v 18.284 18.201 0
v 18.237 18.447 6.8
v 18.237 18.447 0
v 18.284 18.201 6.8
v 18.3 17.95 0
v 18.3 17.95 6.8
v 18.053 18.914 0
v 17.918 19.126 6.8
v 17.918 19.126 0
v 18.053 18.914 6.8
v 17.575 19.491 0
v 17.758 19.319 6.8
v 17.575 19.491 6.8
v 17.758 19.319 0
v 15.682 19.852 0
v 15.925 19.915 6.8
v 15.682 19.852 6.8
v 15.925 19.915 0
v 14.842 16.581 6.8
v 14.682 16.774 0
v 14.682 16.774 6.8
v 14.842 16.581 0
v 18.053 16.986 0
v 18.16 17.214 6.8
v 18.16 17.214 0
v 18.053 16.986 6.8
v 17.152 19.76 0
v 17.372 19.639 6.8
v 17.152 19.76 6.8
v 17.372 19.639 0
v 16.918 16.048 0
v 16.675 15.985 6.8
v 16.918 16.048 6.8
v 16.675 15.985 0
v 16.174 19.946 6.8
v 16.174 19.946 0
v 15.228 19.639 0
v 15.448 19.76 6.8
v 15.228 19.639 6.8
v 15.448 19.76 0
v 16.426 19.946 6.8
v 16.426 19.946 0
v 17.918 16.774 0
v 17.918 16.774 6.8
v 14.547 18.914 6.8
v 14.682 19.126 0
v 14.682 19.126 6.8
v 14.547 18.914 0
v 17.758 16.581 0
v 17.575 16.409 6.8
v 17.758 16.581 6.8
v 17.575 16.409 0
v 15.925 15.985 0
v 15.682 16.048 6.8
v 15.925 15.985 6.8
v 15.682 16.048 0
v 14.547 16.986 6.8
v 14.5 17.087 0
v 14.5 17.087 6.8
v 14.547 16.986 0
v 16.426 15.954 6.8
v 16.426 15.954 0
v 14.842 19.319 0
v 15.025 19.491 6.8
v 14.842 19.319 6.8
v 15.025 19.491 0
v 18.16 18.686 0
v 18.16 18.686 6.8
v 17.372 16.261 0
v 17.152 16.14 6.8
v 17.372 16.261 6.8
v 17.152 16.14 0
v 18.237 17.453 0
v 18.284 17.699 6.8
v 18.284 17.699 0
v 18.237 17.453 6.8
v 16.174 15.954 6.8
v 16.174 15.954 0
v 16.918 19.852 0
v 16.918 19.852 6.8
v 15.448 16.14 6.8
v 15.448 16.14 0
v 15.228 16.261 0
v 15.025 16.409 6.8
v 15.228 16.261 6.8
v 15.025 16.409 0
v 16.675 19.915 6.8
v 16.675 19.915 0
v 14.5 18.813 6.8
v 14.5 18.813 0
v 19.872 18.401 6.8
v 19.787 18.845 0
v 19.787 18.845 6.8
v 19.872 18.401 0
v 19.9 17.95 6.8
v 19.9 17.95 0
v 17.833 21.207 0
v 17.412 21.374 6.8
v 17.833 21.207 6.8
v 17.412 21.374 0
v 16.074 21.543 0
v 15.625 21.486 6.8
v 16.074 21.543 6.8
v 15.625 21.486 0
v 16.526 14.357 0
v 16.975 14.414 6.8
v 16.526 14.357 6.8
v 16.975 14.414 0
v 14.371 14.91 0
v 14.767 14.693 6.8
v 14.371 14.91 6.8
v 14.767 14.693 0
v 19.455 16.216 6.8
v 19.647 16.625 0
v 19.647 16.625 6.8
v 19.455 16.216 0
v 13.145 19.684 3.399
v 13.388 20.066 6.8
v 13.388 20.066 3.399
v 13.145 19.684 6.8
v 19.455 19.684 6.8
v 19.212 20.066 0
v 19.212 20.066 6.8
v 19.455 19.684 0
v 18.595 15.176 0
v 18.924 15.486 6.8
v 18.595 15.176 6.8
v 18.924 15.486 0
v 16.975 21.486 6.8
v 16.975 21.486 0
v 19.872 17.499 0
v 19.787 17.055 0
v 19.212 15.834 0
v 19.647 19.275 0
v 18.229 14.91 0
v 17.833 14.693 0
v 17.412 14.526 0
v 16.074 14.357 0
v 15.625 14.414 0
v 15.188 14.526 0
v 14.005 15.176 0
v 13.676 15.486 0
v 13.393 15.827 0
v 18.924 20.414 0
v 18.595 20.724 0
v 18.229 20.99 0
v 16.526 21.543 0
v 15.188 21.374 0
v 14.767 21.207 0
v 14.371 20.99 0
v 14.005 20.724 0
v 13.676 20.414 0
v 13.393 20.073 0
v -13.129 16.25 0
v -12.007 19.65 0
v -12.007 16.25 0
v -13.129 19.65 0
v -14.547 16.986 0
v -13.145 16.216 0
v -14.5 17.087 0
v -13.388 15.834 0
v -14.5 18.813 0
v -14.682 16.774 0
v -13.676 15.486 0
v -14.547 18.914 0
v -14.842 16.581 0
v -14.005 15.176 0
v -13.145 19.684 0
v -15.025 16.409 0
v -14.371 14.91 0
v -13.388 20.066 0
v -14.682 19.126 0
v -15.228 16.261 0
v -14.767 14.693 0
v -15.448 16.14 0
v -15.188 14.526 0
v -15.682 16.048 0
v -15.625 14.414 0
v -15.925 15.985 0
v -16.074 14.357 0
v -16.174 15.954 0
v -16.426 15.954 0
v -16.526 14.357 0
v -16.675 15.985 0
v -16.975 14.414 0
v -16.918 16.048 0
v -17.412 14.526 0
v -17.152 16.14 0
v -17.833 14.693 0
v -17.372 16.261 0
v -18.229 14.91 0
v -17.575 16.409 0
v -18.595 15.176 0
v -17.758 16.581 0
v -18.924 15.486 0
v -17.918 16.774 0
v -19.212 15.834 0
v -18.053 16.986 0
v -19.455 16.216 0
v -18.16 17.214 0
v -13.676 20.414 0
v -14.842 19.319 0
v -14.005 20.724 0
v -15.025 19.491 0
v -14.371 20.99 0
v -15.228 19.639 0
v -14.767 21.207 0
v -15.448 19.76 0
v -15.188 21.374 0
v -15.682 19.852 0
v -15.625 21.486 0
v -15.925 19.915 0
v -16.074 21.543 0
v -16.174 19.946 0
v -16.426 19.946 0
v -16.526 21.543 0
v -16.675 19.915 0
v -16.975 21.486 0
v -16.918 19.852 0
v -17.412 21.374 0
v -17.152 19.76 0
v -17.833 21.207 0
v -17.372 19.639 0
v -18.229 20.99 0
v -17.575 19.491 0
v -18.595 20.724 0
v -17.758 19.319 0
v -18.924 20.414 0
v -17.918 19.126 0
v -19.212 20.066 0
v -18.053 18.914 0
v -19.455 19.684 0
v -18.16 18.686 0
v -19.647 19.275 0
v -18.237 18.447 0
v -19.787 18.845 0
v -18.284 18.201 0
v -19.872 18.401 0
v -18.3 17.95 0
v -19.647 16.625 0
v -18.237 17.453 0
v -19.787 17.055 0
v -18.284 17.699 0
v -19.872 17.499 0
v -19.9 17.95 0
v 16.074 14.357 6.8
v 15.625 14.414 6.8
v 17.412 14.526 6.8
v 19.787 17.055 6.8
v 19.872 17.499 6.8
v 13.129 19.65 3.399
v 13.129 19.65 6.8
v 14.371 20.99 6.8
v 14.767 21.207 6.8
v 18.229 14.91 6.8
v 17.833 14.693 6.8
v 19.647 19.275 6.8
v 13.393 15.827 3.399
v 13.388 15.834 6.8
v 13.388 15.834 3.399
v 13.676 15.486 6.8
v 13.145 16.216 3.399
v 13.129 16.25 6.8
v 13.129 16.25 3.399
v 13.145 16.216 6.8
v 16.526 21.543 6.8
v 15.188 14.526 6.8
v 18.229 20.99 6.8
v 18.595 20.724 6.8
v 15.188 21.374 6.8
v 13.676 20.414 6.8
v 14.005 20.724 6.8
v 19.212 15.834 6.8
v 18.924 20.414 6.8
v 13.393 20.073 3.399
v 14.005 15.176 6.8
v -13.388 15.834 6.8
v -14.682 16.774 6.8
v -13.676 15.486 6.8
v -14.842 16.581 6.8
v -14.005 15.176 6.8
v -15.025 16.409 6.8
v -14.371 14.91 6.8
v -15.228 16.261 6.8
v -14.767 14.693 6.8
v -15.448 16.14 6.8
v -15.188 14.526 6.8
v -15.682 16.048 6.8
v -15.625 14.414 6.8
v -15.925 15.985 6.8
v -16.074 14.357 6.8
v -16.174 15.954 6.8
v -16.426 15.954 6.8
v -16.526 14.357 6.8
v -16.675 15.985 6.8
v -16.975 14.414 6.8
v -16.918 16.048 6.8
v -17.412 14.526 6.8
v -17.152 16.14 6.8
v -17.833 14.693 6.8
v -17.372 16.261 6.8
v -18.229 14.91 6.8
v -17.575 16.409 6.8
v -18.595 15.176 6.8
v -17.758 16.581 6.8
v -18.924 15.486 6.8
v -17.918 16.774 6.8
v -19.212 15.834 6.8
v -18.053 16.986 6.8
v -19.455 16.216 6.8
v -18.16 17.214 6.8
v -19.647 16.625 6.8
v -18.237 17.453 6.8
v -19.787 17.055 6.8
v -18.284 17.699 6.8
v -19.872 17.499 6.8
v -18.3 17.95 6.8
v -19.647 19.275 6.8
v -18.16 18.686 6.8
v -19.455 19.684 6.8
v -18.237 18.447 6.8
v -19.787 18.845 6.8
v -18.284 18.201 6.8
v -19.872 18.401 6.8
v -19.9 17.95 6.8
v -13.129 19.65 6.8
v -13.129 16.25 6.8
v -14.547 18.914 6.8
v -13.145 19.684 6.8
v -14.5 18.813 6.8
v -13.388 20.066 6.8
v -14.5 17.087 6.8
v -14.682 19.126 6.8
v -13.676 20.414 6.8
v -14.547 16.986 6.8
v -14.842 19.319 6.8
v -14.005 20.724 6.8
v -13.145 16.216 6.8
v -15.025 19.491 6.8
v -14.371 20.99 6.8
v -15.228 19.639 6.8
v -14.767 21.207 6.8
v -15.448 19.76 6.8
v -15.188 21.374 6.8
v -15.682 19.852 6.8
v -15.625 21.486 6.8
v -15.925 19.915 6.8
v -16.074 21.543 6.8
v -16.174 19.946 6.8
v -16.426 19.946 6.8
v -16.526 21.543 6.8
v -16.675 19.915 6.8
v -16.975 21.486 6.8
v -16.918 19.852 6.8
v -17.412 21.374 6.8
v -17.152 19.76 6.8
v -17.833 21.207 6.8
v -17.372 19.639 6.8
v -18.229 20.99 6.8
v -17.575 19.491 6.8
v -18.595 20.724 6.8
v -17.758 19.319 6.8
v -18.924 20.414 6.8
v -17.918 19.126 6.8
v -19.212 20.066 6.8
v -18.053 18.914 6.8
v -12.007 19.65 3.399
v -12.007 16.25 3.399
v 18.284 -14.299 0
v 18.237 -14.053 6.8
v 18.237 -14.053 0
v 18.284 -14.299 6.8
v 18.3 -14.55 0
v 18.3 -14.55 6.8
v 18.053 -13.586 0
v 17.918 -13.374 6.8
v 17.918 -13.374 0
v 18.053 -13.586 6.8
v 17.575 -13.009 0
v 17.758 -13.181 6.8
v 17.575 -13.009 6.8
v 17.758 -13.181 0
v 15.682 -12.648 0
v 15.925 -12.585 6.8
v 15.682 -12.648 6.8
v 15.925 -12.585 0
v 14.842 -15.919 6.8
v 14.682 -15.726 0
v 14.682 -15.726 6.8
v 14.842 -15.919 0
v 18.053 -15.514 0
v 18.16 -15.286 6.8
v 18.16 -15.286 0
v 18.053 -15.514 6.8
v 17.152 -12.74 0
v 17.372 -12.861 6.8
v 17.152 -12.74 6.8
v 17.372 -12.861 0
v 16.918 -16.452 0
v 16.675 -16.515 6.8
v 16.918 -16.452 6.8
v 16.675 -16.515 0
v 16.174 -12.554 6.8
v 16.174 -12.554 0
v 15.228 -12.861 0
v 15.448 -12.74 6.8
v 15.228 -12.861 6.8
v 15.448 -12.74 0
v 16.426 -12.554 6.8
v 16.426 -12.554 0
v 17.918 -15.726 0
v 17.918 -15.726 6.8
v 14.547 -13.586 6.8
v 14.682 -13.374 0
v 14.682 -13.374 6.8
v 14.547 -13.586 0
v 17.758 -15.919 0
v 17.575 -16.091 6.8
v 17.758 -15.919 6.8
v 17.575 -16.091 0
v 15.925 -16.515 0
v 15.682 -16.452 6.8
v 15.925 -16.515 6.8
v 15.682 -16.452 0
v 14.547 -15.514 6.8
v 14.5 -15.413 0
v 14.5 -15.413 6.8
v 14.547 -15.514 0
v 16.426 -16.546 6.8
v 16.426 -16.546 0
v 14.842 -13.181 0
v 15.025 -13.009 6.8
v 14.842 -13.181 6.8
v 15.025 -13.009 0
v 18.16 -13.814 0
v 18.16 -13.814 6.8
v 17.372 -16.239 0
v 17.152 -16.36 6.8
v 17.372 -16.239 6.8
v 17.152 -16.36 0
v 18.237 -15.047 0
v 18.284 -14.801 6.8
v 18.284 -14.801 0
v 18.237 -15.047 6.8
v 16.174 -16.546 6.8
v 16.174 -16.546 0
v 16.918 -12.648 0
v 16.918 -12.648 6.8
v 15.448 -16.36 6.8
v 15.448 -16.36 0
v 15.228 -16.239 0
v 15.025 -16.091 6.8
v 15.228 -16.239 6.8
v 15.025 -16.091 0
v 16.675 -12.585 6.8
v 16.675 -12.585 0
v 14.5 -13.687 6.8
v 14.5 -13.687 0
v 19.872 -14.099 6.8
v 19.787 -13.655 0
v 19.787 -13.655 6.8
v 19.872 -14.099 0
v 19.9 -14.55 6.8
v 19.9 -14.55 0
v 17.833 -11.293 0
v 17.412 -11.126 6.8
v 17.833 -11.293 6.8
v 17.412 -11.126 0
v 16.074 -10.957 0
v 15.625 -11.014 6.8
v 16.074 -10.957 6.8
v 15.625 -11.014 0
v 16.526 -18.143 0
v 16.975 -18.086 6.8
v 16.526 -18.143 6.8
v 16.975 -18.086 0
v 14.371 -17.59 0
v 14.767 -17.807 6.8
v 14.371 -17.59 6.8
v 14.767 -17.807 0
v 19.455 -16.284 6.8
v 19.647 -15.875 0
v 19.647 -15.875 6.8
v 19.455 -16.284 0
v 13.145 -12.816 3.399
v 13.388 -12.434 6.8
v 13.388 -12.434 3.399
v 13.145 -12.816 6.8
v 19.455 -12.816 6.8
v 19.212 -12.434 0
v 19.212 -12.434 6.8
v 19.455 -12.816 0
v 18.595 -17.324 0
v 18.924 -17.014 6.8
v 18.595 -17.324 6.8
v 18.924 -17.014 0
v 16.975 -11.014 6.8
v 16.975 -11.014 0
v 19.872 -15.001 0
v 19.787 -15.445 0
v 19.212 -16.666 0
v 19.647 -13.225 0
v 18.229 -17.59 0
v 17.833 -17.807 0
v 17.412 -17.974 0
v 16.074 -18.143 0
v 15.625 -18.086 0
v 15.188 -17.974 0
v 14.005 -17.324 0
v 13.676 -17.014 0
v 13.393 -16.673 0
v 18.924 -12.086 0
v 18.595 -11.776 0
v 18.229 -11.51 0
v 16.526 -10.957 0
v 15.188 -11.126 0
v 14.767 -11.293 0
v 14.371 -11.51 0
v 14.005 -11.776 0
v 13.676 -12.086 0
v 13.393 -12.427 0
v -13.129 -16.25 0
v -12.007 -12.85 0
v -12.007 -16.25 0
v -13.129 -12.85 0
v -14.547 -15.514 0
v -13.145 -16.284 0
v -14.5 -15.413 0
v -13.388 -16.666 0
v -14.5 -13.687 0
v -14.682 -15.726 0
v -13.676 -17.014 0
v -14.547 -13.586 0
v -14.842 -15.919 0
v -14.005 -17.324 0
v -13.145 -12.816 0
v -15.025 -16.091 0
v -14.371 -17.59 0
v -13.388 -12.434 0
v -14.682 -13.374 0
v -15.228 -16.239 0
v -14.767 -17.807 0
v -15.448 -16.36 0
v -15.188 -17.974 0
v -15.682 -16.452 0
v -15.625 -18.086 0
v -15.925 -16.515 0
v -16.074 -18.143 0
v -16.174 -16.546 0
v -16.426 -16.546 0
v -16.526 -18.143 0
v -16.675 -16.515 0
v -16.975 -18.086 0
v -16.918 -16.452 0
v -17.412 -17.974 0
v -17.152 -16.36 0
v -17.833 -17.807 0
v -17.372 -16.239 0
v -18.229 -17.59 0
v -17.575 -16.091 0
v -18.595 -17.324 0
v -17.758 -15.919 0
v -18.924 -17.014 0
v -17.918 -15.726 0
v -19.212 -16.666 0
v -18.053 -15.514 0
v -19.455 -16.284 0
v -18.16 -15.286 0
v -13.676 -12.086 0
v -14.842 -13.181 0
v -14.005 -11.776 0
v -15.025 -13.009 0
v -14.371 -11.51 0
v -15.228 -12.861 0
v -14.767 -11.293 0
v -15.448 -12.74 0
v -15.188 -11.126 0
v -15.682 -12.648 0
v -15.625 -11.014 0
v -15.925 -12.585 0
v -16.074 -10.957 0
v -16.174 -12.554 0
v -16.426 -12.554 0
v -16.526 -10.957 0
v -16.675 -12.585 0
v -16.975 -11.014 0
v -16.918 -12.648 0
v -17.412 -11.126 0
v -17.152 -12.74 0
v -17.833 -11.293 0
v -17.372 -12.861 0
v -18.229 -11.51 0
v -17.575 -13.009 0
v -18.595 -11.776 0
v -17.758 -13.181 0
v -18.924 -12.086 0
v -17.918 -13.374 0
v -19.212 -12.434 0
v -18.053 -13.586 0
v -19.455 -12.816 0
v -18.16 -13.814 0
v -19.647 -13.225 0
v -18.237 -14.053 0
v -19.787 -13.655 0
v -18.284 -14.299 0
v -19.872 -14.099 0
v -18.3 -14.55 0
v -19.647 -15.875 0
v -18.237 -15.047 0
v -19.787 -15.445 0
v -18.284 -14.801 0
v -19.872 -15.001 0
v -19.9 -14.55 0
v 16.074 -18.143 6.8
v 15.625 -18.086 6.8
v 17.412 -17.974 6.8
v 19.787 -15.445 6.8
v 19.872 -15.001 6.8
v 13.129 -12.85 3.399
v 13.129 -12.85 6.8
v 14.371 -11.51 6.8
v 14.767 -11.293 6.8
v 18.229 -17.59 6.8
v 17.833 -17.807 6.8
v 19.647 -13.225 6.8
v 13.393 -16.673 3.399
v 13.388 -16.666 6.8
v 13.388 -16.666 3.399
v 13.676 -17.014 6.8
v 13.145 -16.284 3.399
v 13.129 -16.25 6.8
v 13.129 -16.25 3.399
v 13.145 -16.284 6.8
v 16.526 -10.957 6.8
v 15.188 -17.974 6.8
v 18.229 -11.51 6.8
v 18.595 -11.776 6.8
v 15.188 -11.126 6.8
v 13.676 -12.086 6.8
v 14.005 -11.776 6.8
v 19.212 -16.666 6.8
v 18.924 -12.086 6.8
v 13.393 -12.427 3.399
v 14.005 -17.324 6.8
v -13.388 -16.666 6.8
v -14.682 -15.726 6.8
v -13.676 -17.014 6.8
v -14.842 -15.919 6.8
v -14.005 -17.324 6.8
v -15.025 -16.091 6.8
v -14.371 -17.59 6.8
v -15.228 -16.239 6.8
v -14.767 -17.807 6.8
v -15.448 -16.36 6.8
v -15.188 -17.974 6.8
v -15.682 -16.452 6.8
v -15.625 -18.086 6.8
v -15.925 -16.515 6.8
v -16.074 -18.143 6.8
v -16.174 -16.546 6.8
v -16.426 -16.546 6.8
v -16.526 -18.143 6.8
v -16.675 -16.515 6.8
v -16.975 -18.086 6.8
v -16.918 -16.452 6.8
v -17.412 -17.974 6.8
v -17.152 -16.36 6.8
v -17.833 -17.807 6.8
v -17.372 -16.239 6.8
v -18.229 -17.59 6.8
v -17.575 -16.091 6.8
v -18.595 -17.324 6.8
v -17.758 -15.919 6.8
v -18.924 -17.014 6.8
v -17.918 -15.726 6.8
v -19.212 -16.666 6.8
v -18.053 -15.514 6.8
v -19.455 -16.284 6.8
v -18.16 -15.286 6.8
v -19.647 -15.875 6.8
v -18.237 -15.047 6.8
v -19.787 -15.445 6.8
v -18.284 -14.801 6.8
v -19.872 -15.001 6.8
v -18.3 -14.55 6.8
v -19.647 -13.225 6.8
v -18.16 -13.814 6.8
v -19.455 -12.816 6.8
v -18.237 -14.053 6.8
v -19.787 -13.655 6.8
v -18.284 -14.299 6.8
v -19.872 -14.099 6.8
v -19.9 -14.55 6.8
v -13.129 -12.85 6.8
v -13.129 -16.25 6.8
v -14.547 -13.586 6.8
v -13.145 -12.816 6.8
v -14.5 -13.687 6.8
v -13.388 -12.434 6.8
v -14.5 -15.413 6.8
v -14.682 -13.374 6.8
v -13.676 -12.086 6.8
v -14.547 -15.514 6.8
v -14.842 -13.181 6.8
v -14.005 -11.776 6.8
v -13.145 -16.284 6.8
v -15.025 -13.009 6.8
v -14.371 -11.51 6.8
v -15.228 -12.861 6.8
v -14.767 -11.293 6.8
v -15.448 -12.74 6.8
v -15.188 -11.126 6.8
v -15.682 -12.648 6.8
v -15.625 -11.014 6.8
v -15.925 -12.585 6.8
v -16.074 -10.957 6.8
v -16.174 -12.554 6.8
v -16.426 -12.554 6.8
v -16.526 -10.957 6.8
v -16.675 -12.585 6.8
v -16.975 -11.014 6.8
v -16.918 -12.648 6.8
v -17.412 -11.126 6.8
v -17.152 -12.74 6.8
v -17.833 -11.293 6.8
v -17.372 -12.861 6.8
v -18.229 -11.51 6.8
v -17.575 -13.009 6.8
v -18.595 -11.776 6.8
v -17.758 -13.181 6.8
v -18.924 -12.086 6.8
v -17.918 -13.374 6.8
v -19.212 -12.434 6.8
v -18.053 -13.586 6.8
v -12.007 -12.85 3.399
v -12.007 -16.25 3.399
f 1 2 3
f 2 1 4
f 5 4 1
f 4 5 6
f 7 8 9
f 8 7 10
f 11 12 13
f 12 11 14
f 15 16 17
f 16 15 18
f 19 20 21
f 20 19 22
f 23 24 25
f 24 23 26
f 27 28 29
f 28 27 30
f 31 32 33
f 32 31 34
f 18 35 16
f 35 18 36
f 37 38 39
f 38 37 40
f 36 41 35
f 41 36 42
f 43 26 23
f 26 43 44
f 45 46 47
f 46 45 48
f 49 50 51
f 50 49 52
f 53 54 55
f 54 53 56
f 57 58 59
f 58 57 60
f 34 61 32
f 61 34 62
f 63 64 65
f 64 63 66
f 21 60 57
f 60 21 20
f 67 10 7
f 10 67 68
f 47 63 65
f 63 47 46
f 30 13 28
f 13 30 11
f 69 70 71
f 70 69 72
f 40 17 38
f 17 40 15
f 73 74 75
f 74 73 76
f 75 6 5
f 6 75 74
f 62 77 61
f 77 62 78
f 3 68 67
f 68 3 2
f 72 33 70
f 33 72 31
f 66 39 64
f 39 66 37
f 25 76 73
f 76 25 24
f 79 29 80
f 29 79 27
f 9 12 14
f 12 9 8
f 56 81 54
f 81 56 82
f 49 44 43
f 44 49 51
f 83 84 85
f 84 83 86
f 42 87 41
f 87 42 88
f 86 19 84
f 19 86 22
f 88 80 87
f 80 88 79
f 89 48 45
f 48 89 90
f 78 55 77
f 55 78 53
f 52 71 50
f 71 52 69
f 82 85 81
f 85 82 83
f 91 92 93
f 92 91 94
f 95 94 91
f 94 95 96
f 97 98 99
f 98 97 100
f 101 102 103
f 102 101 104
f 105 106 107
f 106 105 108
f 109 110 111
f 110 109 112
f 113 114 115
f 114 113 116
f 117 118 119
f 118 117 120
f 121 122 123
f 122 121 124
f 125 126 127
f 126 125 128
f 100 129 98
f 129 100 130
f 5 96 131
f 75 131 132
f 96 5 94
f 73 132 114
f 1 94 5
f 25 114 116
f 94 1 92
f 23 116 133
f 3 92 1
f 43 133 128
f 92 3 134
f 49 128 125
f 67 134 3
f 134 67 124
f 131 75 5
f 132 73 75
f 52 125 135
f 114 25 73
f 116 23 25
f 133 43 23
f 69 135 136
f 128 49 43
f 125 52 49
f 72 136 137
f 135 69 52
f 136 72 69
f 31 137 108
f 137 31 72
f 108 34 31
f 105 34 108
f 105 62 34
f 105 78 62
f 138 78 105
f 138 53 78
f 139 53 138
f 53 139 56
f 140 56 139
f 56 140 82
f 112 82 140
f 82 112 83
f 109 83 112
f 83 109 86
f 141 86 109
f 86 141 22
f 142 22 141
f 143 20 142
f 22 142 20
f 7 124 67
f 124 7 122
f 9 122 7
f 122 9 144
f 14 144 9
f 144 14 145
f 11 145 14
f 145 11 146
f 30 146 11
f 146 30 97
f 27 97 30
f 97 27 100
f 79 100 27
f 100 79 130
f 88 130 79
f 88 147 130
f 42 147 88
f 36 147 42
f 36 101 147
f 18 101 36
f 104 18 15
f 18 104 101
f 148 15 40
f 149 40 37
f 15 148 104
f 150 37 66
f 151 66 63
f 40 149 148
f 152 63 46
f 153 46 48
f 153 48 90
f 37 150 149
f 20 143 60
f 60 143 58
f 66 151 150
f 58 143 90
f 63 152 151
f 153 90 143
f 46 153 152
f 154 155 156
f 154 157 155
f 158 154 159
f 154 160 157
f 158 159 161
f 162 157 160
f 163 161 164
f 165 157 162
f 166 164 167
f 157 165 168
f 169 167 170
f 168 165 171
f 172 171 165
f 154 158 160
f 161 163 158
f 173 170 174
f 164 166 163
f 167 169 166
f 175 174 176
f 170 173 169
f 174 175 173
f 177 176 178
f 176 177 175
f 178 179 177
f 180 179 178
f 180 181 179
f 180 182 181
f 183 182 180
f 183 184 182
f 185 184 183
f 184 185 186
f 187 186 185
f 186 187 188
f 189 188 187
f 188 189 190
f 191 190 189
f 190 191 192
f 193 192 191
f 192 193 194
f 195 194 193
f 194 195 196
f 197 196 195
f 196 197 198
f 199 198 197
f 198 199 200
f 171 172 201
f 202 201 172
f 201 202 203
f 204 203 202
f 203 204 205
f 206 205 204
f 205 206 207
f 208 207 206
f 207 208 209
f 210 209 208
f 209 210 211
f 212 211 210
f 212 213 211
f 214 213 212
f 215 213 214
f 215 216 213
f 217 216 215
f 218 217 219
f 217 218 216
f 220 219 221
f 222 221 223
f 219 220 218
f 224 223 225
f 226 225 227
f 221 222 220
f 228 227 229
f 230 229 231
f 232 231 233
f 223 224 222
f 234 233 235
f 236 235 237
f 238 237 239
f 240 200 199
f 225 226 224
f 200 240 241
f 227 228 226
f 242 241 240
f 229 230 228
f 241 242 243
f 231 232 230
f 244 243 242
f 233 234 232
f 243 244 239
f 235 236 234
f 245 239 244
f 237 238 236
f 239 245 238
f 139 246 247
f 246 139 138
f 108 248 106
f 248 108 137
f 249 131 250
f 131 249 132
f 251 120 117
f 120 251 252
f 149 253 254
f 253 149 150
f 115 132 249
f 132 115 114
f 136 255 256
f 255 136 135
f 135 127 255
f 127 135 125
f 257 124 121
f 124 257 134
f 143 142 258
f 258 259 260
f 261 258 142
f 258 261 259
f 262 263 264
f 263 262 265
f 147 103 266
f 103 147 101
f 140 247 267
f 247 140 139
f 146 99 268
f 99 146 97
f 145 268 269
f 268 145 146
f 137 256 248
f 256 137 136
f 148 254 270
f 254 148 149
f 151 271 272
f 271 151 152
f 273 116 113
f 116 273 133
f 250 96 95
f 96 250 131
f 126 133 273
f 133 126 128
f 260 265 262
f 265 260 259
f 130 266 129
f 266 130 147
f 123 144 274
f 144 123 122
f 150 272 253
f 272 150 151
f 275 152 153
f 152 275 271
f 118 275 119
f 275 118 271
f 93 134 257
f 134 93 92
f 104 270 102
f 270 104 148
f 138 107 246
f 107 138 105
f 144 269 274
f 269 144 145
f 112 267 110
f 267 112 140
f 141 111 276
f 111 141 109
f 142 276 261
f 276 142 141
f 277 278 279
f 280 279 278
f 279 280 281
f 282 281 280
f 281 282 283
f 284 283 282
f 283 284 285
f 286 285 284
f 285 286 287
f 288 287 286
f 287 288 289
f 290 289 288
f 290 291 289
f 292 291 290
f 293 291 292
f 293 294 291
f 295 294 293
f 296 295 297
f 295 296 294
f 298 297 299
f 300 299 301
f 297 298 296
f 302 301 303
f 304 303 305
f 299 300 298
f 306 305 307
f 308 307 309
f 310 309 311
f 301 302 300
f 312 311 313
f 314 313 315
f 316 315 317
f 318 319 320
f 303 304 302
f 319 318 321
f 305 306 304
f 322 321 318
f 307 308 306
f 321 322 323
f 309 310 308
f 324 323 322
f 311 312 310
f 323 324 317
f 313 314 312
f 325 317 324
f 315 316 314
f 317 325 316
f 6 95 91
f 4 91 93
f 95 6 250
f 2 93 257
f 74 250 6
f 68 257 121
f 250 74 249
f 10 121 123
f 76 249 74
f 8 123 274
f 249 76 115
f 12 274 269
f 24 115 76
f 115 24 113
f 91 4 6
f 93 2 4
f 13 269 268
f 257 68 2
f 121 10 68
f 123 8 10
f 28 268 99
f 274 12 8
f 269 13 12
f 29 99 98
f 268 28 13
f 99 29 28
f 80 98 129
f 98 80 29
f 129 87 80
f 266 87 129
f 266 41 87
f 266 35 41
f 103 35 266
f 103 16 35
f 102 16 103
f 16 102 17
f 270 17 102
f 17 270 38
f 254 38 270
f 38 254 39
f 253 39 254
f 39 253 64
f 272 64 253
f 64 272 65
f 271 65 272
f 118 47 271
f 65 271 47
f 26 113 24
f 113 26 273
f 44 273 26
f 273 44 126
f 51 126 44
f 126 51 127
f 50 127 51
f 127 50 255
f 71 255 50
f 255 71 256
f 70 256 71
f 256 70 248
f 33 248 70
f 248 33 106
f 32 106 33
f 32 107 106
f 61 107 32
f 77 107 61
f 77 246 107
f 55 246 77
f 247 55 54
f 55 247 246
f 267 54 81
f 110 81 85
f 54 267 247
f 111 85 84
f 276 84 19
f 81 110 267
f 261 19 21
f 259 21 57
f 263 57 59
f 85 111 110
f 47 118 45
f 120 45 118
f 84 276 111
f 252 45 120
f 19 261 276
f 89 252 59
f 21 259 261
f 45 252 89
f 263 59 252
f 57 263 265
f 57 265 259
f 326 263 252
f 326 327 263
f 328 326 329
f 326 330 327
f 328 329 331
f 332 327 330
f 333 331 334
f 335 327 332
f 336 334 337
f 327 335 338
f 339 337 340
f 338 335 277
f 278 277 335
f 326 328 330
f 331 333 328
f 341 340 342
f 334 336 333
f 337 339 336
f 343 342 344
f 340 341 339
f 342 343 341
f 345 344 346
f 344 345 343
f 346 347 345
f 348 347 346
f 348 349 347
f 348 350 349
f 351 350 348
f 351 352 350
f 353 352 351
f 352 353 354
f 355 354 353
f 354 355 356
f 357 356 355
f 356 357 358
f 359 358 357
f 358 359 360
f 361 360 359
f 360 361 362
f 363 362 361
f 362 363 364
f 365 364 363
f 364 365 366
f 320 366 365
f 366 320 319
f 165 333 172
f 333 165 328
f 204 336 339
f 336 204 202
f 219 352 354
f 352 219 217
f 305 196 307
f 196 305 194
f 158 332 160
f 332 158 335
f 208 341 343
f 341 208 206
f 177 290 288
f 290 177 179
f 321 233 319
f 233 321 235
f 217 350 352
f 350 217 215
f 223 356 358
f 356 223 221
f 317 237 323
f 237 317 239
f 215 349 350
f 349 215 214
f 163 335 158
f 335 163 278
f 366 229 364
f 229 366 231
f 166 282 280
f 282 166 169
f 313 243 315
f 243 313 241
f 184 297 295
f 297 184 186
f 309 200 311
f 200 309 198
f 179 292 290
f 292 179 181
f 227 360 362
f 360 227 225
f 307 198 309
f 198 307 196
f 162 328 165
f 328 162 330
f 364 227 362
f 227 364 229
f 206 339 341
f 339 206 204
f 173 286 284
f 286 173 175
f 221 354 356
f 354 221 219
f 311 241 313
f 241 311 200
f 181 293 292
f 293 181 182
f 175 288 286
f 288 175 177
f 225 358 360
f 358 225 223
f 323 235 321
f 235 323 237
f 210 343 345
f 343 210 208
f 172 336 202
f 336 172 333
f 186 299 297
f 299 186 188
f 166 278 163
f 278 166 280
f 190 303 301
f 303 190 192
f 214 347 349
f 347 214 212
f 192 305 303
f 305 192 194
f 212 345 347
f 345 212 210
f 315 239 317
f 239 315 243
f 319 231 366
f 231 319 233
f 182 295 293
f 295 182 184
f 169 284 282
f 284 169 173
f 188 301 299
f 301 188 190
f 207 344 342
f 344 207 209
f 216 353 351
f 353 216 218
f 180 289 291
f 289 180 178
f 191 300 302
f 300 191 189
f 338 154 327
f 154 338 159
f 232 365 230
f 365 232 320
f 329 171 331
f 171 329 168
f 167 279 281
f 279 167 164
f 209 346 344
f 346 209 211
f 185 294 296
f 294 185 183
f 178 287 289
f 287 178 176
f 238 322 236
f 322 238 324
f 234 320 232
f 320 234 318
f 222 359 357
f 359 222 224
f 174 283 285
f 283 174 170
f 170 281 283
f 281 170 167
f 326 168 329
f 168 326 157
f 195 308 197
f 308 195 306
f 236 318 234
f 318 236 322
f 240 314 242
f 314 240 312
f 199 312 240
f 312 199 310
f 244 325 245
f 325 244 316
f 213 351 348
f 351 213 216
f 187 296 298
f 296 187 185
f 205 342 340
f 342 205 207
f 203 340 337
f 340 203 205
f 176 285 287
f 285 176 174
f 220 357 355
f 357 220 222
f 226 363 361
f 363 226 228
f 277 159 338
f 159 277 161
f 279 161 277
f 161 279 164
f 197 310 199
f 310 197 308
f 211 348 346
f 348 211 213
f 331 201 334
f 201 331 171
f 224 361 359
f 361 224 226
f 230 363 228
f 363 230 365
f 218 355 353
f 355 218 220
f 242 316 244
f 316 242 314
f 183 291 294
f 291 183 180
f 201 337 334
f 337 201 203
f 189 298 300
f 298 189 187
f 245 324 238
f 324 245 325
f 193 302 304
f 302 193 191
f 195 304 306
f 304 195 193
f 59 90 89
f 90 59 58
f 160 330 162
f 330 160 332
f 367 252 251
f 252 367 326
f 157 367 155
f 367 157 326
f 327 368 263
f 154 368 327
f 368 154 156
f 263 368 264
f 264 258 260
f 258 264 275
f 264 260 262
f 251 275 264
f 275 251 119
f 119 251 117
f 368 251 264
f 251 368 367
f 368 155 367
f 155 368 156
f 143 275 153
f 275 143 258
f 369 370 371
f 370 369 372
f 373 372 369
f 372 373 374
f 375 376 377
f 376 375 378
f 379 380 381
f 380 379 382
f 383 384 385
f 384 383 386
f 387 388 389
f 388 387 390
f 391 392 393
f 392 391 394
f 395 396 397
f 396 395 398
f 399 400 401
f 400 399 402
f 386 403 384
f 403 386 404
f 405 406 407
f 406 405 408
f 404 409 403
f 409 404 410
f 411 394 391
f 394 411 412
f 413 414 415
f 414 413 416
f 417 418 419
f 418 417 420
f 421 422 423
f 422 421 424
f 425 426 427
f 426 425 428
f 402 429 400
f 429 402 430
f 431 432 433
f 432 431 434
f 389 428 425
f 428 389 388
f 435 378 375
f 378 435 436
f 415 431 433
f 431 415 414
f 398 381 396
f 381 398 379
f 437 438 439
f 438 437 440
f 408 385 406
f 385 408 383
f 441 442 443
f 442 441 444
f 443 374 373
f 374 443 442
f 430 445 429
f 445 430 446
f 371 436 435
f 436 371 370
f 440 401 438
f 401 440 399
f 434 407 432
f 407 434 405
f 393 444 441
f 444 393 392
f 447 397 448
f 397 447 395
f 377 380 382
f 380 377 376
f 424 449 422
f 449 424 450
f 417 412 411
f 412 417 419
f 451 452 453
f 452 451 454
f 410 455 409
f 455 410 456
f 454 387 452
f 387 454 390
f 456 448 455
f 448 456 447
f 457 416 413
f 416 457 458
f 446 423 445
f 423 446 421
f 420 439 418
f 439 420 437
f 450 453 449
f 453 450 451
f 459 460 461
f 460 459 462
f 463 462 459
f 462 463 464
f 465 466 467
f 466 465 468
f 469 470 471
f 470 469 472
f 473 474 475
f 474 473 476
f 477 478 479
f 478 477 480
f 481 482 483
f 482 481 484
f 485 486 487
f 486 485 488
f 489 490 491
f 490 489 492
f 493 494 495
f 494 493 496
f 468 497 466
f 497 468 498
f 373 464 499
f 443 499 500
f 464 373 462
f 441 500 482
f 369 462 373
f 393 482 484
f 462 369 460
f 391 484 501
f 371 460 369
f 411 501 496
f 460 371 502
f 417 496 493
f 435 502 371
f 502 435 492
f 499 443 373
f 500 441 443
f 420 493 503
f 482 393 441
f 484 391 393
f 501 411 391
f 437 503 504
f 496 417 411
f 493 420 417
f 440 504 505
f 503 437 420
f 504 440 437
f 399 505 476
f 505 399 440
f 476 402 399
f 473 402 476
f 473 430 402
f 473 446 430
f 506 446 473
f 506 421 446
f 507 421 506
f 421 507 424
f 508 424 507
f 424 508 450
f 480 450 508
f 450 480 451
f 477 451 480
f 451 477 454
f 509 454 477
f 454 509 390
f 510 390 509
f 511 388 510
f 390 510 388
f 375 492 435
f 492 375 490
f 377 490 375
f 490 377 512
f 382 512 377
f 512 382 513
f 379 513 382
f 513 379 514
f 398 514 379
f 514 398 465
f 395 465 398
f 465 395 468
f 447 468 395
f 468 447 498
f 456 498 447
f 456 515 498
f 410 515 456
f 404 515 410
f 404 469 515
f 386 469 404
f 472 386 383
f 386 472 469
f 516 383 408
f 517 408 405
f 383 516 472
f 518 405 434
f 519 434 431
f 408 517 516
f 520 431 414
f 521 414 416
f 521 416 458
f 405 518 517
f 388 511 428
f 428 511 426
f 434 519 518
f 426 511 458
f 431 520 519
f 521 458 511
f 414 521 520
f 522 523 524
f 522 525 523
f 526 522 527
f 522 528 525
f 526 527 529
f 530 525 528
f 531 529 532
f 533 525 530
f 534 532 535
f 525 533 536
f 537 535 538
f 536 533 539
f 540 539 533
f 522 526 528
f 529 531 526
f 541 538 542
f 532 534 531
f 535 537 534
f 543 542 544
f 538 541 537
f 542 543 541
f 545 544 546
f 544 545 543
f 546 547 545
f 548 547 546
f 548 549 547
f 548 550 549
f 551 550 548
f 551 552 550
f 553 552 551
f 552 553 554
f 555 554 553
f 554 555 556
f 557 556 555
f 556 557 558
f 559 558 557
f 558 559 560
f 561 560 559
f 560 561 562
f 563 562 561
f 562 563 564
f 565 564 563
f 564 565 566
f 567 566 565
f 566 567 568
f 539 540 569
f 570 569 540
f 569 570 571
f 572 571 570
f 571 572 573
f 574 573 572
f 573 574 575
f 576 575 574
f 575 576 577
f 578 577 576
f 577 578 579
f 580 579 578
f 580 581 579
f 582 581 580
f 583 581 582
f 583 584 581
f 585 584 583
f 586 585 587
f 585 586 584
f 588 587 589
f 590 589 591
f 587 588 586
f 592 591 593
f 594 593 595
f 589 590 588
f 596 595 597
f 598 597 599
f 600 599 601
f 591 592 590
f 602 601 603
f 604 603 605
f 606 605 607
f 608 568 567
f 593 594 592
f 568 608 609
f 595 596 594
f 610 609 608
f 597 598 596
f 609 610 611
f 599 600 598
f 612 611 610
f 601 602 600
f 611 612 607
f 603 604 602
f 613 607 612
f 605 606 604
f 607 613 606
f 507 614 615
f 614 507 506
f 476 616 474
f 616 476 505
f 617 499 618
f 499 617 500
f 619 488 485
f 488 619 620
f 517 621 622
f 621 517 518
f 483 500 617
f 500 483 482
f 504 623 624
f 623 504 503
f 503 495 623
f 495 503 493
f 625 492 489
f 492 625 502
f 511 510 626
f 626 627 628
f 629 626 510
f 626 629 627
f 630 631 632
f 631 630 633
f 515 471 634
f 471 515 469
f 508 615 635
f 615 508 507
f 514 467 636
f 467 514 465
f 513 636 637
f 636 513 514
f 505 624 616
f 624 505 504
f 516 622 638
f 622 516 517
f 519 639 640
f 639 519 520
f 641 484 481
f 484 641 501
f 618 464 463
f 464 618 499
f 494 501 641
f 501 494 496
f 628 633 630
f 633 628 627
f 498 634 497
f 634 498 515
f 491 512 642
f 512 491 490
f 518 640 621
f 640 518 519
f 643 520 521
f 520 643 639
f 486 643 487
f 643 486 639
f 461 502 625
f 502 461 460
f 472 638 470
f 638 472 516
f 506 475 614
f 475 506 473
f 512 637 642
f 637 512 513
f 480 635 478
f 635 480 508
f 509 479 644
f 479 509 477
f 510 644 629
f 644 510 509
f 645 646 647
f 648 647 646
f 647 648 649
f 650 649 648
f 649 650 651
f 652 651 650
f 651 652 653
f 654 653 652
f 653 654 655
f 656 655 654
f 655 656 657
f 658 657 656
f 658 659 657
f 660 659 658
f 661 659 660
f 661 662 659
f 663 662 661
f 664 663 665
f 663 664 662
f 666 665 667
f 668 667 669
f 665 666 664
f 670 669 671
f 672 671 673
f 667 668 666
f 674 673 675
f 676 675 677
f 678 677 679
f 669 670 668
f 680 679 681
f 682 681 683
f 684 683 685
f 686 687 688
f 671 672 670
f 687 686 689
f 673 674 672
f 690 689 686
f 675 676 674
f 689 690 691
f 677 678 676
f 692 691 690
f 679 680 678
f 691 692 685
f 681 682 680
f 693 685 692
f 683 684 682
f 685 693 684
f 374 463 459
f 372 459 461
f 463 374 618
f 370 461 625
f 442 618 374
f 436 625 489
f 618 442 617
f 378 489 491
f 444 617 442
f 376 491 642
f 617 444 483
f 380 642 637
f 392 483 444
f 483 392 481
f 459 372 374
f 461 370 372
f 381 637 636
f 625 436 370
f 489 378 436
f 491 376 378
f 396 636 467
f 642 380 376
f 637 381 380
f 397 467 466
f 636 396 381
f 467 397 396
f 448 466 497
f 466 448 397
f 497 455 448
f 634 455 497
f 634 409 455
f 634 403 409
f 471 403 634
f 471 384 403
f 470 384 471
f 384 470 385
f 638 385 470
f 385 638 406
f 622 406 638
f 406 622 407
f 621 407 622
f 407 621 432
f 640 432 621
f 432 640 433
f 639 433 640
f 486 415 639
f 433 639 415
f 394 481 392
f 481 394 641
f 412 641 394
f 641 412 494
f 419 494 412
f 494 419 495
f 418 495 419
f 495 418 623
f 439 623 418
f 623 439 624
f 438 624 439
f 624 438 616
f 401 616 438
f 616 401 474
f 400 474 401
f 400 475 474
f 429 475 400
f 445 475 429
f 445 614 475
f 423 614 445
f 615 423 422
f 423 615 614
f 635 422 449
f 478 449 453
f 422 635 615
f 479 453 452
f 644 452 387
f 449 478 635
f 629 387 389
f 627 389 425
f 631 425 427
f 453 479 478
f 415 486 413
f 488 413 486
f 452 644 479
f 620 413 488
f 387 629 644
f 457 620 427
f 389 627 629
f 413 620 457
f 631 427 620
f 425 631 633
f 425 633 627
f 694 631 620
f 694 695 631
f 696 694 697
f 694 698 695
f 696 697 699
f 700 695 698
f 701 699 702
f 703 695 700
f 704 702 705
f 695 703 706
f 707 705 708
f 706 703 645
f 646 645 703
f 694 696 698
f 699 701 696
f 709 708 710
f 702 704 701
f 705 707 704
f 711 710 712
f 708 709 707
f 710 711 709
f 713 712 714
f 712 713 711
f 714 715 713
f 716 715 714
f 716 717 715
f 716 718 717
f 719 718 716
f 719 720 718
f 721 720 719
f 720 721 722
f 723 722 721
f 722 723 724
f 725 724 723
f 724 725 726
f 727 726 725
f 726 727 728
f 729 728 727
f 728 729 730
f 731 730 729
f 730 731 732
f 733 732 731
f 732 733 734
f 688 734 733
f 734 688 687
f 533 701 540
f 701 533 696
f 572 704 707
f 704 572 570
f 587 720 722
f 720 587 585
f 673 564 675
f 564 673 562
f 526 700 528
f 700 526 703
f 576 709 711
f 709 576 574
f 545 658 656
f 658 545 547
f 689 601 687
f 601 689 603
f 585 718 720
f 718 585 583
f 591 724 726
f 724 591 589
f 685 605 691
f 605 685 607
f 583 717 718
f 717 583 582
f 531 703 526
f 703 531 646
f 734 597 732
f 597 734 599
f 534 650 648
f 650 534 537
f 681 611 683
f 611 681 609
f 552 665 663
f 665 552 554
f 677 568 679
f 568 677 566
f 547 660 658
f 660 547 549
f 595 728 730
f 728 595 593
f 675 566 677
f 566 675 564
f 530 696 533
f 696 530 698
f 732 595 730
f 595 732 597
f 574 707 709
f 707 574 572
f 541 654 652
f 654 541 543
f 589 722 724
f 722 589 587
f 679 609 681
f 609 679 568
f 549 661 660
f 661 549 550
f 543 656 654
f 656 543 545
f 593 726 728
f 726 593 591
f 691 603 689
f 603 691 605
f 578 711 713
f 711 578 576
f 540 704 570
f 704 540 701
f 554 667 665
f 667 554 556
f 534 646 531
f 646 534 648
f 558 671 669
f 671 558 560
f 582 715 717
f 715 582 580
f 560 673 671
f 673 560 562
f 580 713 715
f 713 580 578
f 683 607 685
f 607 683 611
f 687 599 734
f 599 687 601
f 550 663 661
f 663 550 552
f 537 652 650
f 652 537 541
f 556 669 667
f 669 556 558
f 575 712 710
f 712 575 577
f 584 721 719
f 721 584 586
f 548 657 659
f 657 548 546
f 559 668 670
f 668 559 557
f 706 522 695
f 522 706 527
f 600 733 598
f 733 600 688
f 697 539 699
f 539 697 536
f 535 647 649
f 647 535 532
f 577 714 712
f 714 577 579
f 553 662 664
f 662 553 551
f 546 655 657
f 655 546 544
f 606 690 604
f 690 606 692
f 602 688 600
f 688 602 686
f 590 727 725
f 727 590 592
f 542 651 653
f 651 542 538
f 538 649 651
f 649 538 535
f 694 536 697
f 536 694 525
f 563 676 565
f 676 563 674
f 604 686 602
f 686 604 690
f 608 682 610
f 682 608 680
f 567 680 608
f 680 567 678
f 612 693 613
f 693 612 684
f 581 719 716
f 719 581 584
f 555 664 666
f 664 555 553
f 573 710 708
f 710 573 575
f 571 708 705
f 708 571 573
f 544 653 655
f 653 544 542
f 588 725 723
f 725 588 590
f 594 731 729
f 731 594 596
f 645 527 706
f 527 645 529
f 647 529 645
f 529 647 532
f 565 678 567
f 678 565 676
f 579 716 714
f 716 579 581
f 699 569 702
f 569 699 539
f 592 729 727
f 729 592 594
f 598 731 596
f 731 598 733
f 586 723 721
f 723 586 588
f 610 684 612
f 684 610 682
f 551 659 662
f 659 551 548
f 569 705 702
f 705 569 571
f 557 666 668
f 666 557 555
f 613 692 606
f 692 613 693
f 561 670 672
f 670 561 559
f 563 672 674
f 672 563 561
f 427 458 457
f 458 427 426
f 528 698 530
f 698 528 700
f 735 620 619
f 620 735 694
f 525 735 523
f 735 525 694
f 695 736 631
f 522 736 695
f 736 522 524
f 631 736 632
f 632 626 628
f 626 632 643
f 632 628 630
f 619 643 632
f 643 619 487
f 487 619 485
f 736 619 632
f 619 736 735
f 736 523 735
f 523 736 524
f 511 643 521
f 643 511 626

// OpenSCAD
// file: ../Vitamins/Tools/Filament_Vitamin.scad
function FilamentDiam()=1.75;
function FilamentHeight()=70;
module Filament(3DPrinterTolerance=.4)
{
	$fn=50;
	cylinder(h=FilamentHeight(), r=FilamentDiam(3dPrinterTolerance)/2);
}

Filament();
// file: ../Vitamins/Tools/Standard_Extruder_Spacing_Vitamin.scad
//This is not a physical part; rather it is used to define the spacing of the bottom screws on the servostruder. it can be called for any extruder model. NOTE: the measurement was taken from the 



function StandardServoSpacing()=54
// file: ../Vitamins/Structural/SealedBearings/SealedBearing608_Vitamin.scad
function BallBearingDiam() = 22;
function BallBearingHeight() = 7;
function BallBearingInnerDiam()= 8;


module BallBearing(3dPrinterTolerance=.04)
{
cylinder(BallBearingHeight(), (BallBearingDiam()+3dPrinterTolerance)/2, (BallBearingDiam()+3dPrinterTolerance)/2, 0);
}

BallBearing();
// file: ../Vitamins/Actuators/StandardServo/Servo_Connector_Vitamin.scad
$fn=50;

function ConnectorLength() = 14;
function ConnectorWidth() = 8; 
function ConnectorHeight() = 2.85;

//Note: each pin is approximately 2.25mm wide.  this is a 3 pin connector.

module ServoConnector(3dPrinterTolerance=.4){
	translate(-[(ConnectorLength()+3dPrinterTolerance)/2,(ConnectorWidth()+3dPrinterTolerance)/2,(ConnectorHeight()+3dPrinterTolerance)/2]){
		cube([ConnectorLength()+3dPrinterTolerance,ConnectorWidth()+3dPrinterTolerance,ConnectorHeight()+3dPrinterTolerance]);
	}
}

ServoConnector(.4);
// file: ../Vitamins/Electronics/Hot_Ends/PrintrBotJHeadHotEnd_Vitamin.scad
$fn=50;
function HotEndDiam() = 16;
function HotEndRecessDiam() = 7;
function HotEndRecessHeight() = 2;
function HotEndRecessDepth() = 1.95;
function HotEndRecessOffset() = 2.6;
function HotEndLength() = 58;

module HotEnd(ScrewChannel=false,3dPrinterTolerance=.4){
	if(ScrewChannel==false){	
		cylinder(HotEndLength(),HotEndDiam()/2+3dPrinterTolerance,HotEndDiam()/2+3dPrinterTolerance);
	}else{
		difference(){
			cylinder(HotEndLength(),HotEndDiam()/2+3dPrinterTolerance,HotEndDiam()/2+3dPrinterTolerance);
			translate([0,0,HotEndLength()-HotEndRecessOffset()]){
				difference(){
					cylinder(HotEndRecessHeight(),HotEndDiam()/2+1+3dPrinterTolerance,HotEndDiam()/2+1+3dPrinterTolerance);
					cylinder(HotEndRecessHeight(),(HotEndDiam()-HotEndRecessDepth())/2+.4+3dPrinterTolerance,(HotEndDiam()-HotEndRecessDepth())/2+.4+3dPrinterTolerance);
				}
			}
		}
	}
}

HotEnd(false,.4);		
// file: ExtruderIdlerWheel.scad
use <../Vitamins/Structural/SealedBearings/SealedBearing608_Vitamin.scad>;
use <../Vitamins/Sensors/Encoders/EncoderMagnet_Vitamin.scad>;
$fn=50;
function ExtruderIdlerWheelThickness(3dPrinterTolerance=.4) = 1.65+3dPrinterTolerance;
function ExtruderIdlerWheelDiam(3dPrinterTolerance=.4) = 33.5+3dPrinterTolerance;
function ExtruderIdlerWheelInnerDiam(3dPrinterTolerance=.4) = 32+3dPrinterTolerance;

module IdlerWheel(3dPrinterTolerance=.4){
difference()
{
	union()
	{
		cylinder(MagnetLength(3dPrinterTolerance), 608BallBearingInnerDiam(-3dPrinterTolerance)/2, 608BallBearingInnerDiam(-3dPrinterTolerance)/2);
			translate([0,0,MagnetLength(3dPrinterTolerance)-ExtruderIdlerWheelThickness(3dPrinterTolerance)-(MagnetLength(3dPrinterTolerance)-608BallBearingHeight(3dPrinterTolerance))])
			{
				cylinder(MagnetLength(3dPrinterTolerance)-608BallBearingHeight(3dPrinterTolerance),((608BallBearingDiam(3dPrinterTolerance)+608BallBearingInnerDiam(3dPrinterTolerance))/2)/2,((608BallBearingDiam(3dPrinterTolerance)+608BallBearingInnerDiam(3dPrinterTolerance))/2)/2);
			}
			translate([0,0,MagnetLength(3dPrinterTolerance)-ExtruderIdlerWheelThickness(3dPrinterTolerance)])
			{
				cylinder(ExtruderIdlerWheelThickness(3dPrinterTolerance),ExtruderIdlerWheelDiam(3dPrinterTolerance)/2,ExtruderIdlerWheelInnerDiam(3dPrinterTolerance)/2);
			}
			translate([ExtruderIdlerWheelInnerDiam(3dPrinterTolerance)/3,0,MagnetLength(3dPrinterTolerance)])
			{
				cylinder(ExtruderIdlerWheelThickness(3dPrinterTolerance),608BallBearingInnerDiam(-3dPrinterTolerance)/3, 608BallBearingInnerDiam(-3dPrinterTolerance)/3);
			}	
			translate([-ExtruderIdlerWheelInnerDiam(3dPrinterTolerance)/3,0,MagnetLength(3dPrinterTolerance)])
			{
				cylinder(ExtruderIdlerWheelThickness(3dPrinterTolerance),608BallBearingInnerDiam(-3dPrinterTolerance)/3, 608BallBearingInnerDiam(-3dPrinterTolerance)/3);
			}		
	}
	EncoderMagnet(true,.4);
	translate([0,-(ExtruderIdlerWheelInnerDiam(3dPrinterTolerance)/3),MagnetLength(3dPrinterTolerance)-ExtruderIdlerWheelThickness(3dPrinterTolerance)-2])
	{
		cylinder(ExtruderIdlerWheelThickness(3dPrinterTolerance)+4,608BallBearingInnerDiam(3dPrinterTolerance)/3,608BallBearingInnerDiam(3dPrinterTolerance)/3);
	}
	translate([0,(ExtruderIdlerWheelInnerDiam(3dPrinterTolerance)/3),MagnetLength(3dPrinterTolerance)-ExtruderIdlerWheelThickness(3dPrinterTolerance)-2])
	{
		cylinder(ExtruderIdlerWheelThickness(3dPrinterTolerance)+4,608BallBearingInnerDiam(3dPrinterTolerance)/3,608BallBearingInnerDiam(3dPrinterTolerance)/3);
	}
}
}
IdlerWheel(.4);	
// file: Extruder.scad
$fn=50;
use <../Vitamins/Electronics/Hot_Ends/PrintrBotJHeadHotEnd_Vitamin.scad>;
use <../Vitamins/Actuators/StandardServo/StandardServo_Vitamin.scad>;
use <../Vitamins/Actuators/StandardServo/Servo_Connector_Vitamin.scad>;
use <../Vitamins/Fasteners/Screws/High_Low_Screw_Vitamin.scad>;
use <../Vitamins/Structural/SealedBearings/SealedBearing608_Vitamin.scad>;
use <../Vitamins/Sensors/Encoders/Encoder_Vitamin.scad>;
use <../Vitamins/Sensors/Encoders/EncoderMagnet_Vitamin.scad>;
use <../Vitamins/Tools/Standard_Extruder_Spacing_Vitamin.scad>;
use <../Vitamins/Tools/Filament_Vitamin.scad>;
use <ExtruderIdlerWheel.scad>;

//core dimensions of the part depend on the screw, servo, and servo connector.  Width is based on the standard platform fastener distance.  Parameterize when possible.

function ExtruderLength(3dPrinterTolerance=.4) = StandardServoLength(3dPrinterTolerance)+HiLoScrewLength(3dPrinterTolerance)/2+2*ConnectorLength(3dPrinterTolerance);
function ExtruderHeight(3dPrinterTolerance=.4) = HiLoScrewLength(3dPrinterTolerance)/2;
function ExtruderWidth(3dPrinterTolerance=.4) = StandardExtruderSpacing()+HotEndDiam(3dPrinterTolerance);

function CounterboreRad(3dPrinterTolerance=.4) = HiLoScrewHeadDiameter(3dPrinterTolerance)/2+.5;

//counterbore screw module:
module CounterboreScrew(3dPrinterTolerance=.4){
	union(){
		cylinder(h=HiLoScrewLength()/4, r=CounterboreRad(.4));
		rotate([0,180,0]){HiLoScrew();}
	}
}	

//Creating the basic extruder block
module ExtruderBlock(3dPrinterTolerance=.4)
{
	difference(){
		translate([-ExtruderLength()/2,-ExtruderWidth()/1.8,0]){cube([ExtruderLength(),ExtruderWidth(),ExtruderHeight()]);}
//weight reduction: 
		translate([-ExtruderHeight()-ExtruderIdlerWheelDiam(),-ExtruderIdlerWheelDiam()-FilamentDiam()*2-2,-1]){cylinder(h=ExtruderHeight()+2,r=ExtruderIdlerWheelDiam());}
		translate([-ExtruderLength()/2-1,-ExtruderWidth()/2,-ExtruderHeight()/2+4]){cube([ExtruderHeight()+2,ExtruderWidth(),ExtruderHeight()+4]);}
		translate([-ExtruderLength()/2-HiLoScrewLength()/1.5,ExtruderWidth()/2-ExtruderHeight()+2,-2]){cube([ExtruderLength(),ExtruderWidth()/4,ExtruderHeight()+4]);}
//Counterbored screw holes:
		translate([ExtruderLength()/2-ExtruderIdlerWheelDiam(.4)/5,ExtruderWidth()/2-HiLoScrewHeadDiameter(.4)*2,-.1]){#CounterboreScrew(.4);}
		translate([ExtruderLength(.4)/2-ExtruderIdlerWheelDiam(.4)/5,-ExtruderWidth()/2+HiLoScrewHeadDiameter(.4)/3,-.1]){#CounterboreScrew(.4);}
		translate([-ExtruderLength()/2+ExtruderIdlerWheelDiam(.4),ExtruderWidth()/2-HiLoScrewHeadDiameter(.4)*2,-.1]){CounterboreScrew(.4);}
		translate([-ExtruderLength()/2+ExtruderIdlerWheelDiam(),-ExtruderWidth()/2+StandardServoThickness()/1.5,-.1]){CounterboreScrew(.4);}
//The 608 Bearing.  commented out cube is for cross-section examination
		translate([ExtruderIdlerWheelDiam()/2.5,-ExtruderIdlerWheelDiam()/2,MagnetLength()-ExtruderIdlerWheelThickness()*3+1]){cylinder(h=608BallBearingHeight(3dPrinterTolerance)+ExtruderIdlerWheelThickness(),r=(608BallBearingDiam()+.04)/2);}
		translate([ExtruderIdlerWheelDiam()/2.5,-ExtruderIdlerWheelDiam()/2,ExtruderHeight()/2-ExtruderIdlerWheelThickness()*2.25]){608BallBearing();}
		//translate([0,-ExtruderWidth()/2-608BallBearingDiam(3dPrinterTolerance)/5,-ExtruderHeight()]){cube([100,20,100]);}
//the hot end:
		translate([ExtruderWidth()/2,0,ExtruderHeight()]){rotate([0,90,0]){HotEnd(true,.4);}}
//the filament channel:
		rotate([0,90,0]){translate([-ExtruderHeight(),0,-ExtruderLength()/2-2]){Filament();}}
		rotate([0,90,0]){translate([-ExtruderHeight(),0,-ExtruderLength()/2-2]){cylinder(FilamentHeight()/4,FilamentDiam()*4,FilamentDiam()/2);}}
//Platform connector Screws:
		translate([ExtruderLength()/2+HiLoScrewLength()/2,-ExtruderWidth()/2+HotEndDiam()/2,ExtruderHeight()]){rotate([0,90,0]){HiLoScrew();}}
		mirror([0,0,1]){translate([ExtruderLength()/2+HiLoScrewLength()/2,StandardExtruderSpacing()/2,-ExtruderHeight()]){rotate([0,90,0]){HiLoScrew();}}}
//The Idler Wheel Recess:
		translate([ExtruderIdlerWheelDiam()/2.5,-ExtruderIdlerWheelDiam()/2,ExtruderHeight(3dPrinterTolerance)/2-ExtruderIdlerWheelThickness(3dPrinterTolerance)]){IdlerWheelKeepaway(.4);}
//The Idler Wheel (use for adjusting the filament and servo locations):
		translate([ExtruderIdlerWheelDiam()/2.5,-ExtruderIdlerWheelDiam()/2,ExtruderHeight(3dPrinterTolerance)/2-ExtruderIdlerWheelThickness(3dPrinterTolerance)]){IdlerWheel(.4);}
//The thru hole for the idler wheel:
		translate([ExtruderIdlerWheelDiam()/2.5,-ExtruderIdlerWheelDiam()/2,-1]){cylinder(h=MagnetLength(3dPrinterTolerance)*2, r=608BallBearingInnerDiam(-3dPrinterTolerance)/2);}
//The hole for the servo connector:
		translate([-ExtruderIdlerWheelDiam(3dPrinterTolerance)/4-1,-StandardServoThickness()/2-1,ConnectorLength()/2]){rotate([0,90,90]){ServoConnector(.4);}}

	}
}

//ExtruderBlock(.4);

//Removing feature elements from block. The boolean creates either a servo side or an encoder side.

module Extruder(servo=true, 3dPrinterTolerance=.4)
{
	if(servo==true){
		difference(){
			ExtruderBlock(.4);
		
		//the servo:
			translate([ExtruderIdlerWheelDiam()/2.5,StandardServoNubDiam()/2+FilamentDiam()/4,StandardServoHeightAbvWings()*2-ExtruderIdlerWheelThickness()-.25]){rotate([0,0,-90]){StandardServoMotor(true,2,true,.4);}}
		}
	}else{
		difference(){
			ExtruderBlock(.4);
			translate([ExtruderIdlerWheelDiam()/2.5,-ExtruderIdlerWheelDiam()/2,]){rotate([0,180,0]){#Encoder(false);}}
		}
	}
}
Extruder(false,.4);

translate([0,ExtruderWidth()*1.5,ExtruderHeight()]){mirror([0,0,90]){Extruder(true,.4);};}
				
			
// file: ../Vitamins/Fasteners/Screws/High_Low_Screw_Vitamin.scad
function HiLoScrewDiameter()= 3.6;  
function HiLoScrewLength()= 22;
function HiLoScrewHeadDiameter()= 6.7;
function HiLoScrewHeadHeight()= 2.5;

//err on the side of smaller tolerances for screws

module HiLoScrew(3dPrinterTolerance=.4)
{
	union()
	{
		translate([0,0,-HiLoScrewLength()])
		{
			cylinder(HiLoScrewLength()+3dPrinterTolerance, (HiLoScrewDiameter()+3dPrinterTolerance)/2, (HiLoScrewDiameter()+3dPrinterTolerance)/2);
		}
		cylinder(HiLoScrewHeadHeight(), HiLoScrewHeadDiameter()/2,HiLoScrewHeadDiameter()/2);
	}
}

HiLoScrew();
// file: ../Vitamins/Sensors/Encoders/EncoderMagnet_Vitamin.scad
$fn=100;

function MagnetDiam(3dPrinterTolerance=.4) = 3.1+3dPrinterTolerance;
function MagnetLength(3dPrinterTolerance=.4) = 6.35+3dPrinterTolerance;

module EncoderMagnet(Cylinder=true,3dPrinterTolerance=.4){

	if(Cylinder==true){
		cylinder(MagnetLength(3dPrinterTolerance),MagnetDiam(3dPrinterTolerance)/2,MagnetDiam(3dPrinterTolerance)/2);
	}else{
	translate([-(MagnetDiam(3dPrinterTolerance))/2,-(MagnetDiam(3dPrinterTolerance))/2,0]){
		cube([MagnetDiam(3dPrinterTolerance),MagnetDiam(3dPrinterTolerance),MagnetLength(3dPrinterTolerance)]);
		}
	}
}

EncoderMagnet(true,.4);
// file: ../Vitamins/Sensors/Encoders/Encoder_Vitamin.scad
use <../../Fasteners/Screws/High_Low_Screw_Vitamin.scad>

function EncoderWidth(3dPrinterTolerance=.4)=35.5+ 3dPrinterTolerance;
function EncoderHeight(3dPrinterTolerance=.4)=25+ 3dPrinterTolerance;
function EncoderThickness(3dPrinterTolerance=.4)=3+ 3dPrinterTolerance;

function EncoderBoltWidth(3dPrinterTolerance=.4)=3+ 3dPrinterTolerance;
function EncoderBoltLength(3dPrinterTolerance=.4)=20+ 3dPrinterTolerance;
function EncoderBoltInset(3dPrinterTolerance=.4)=2.2+ 3dPrinterTolerance/2;

function EncoderLongBoxWidth(3dPrinterTolerance=.4)=9+ 3dPrinterTolerance;

function EncoderShortBoxWidth(3dPrinterTolerance=.4)=10+ 3dPrinterTolerance;
function EncoderShortBoxLength(3dPrinterTolerance=.4)=13.5+ 3dPrinterTolerance;
function EncoderShortBoxInset(3dPrinterTolerance=.4)=7+ 3dPrinterTolerance/2;

function EncoderBoxHeight(3dPrinterTolerance=.4)=9+EncoderThickness()+ 3dPrinterTolerance;

function EncoderChipSide(3dPrinterTolerance=.4)=4.25+ 3dPrinterTolerance;
function EncoderChipHeight(3dPrinterTolerance=.4)= 1+ 3dPrinterTolerance;
function EncoderChipOffset(3dPrinterTolerance=.4)=4+ 3dPrinterTolerance/2;

//this sort of forces the HiLo screw down so it is closer to the encoder and the encoder doesn't wiggle as much, feel free to change to 0 if you don't want it.
function HiLoOffset()=1.5;


module Encoder(Bolts=true, 3dPrinterTolerance=.4)
{
	//centers the encoder on the chip, which is the important part
	translate([-EncoderWidth(3dPrinterTolerance)/2,-EncoderChipOffset(3dPrinterTolerance)-EncoderChipSide(3dPrinterTolerance)/2,0])
	{
		union()
		{
	//base
			cube([EncoderWidth(3dPrinterTolerance), EncoderHeight(3dPrinterTolerance), EncoderThickness(3dPrinterTolerance)]);
	//chip
			translate([EncoderWidth(3dPrinterTolerance)/2-EncoderChipSide(3dPrinterTolerance)/2, EncoderChipOffset(3dPrinterTolerance), -EncoderChipHeight(3dPrinterTolerance)])
			{
				cube([EncoderChipSide(3dPrinterTolerance), EncoderChipSide(3dPrinterTolerance),EncoderChipHeight(3dPrinterTolerance)]);
			}
	//boxes
			translate([EncoderShortBoxInset(3dPrinterTolerance)+EncoderShortBoxWidth(3dPrinterTolerance),0,0])
			{
				cube([EncoderLongBoxWidth(3dPrinterTolerance), EncoderHeight(3dPrinterTolerance), EncoderBoxHeight(3dPrinterTolerance)]);
			}
			translate([EncoderShortBoxInset(3dPrinterTolerance),EncoderHeight(3dPrinterTolerance)-EncoderShortBoxLength(3dPrinterTolerance),0])
			{ 
				cube([EncoderShortBoxWidth(3dPrinterTolerance), EncoderShortBoxLength(3dPrinterTolerance), EncoderBoxHeight(3dPrinterTolerance)]);
			}
if(Bolts==true)
	{
	//screws
			translate([EncoderBoltInset(3dPrinterTolerance),EncoderBoltInset(3dPrinterTolerance),-EncoderBoltLength(3dPrinterTolerance)/2])
			{
				cylinder(EncoderBoltLength(3dPrinterTolerance), EncoderBoltWidth(3dPrinterTolerance)/2, EncoderBoltWidth(3dPrinterTolerance)/2);
			}
			translate([EncoderWidth(3dPrinterTolerance)-EncoderBoltInset(3dPrinterTolerance),EncoderBoltInset(3dPrinterTolerance),-EncoderBoltLength(3dPrinterTolerance)/2])
			{
				cylinder(EncoderBoltLength(3dPrinterTolerance), EncoderBoltWidth(3dPrinterTolerance)/2, EncoderBoltWidth(3dPrinterTolerance)/2);
			}
			translate([EncoderBoltInset(3dPrinterTolerance),EncoderHeight(3dPrinterTolerance)-EncoderBoltInset(3dPrinterTolerance),-EncoderBoltLength(3dPrinterTolerance)/2])
			{
				cylinder(EncoderBoltLength(3dPrinterTolerance), EncoderBoltWidth(3dPrinterTolerance)/2, EncoderBoltWidth(3dPrinterTolerance)/2);
			}
			translate([EncoderWidth(3dPrinterTolerance)-EncoderBoltInset(3dPrinterTolerance),EncoderHeight(3dPrinterTolerance)-EncoderBoltInset(3dPrinterTolerance),-EncoderBoltLength(3dPrinterTolerance)/2])
			{
				cylinder(EncoderBoltLength(3dPrinterTolerance), EncoderBoltWidth(3dPrinterTolerance)/2, EncoderBoltWidth(3dPrinterTolerance)/2);
			}
	}else{}
		}
	}
}

//This is the encoder, complete with its encoder bolts (though bolts can be removed by changing the boolean to "false". It is shown in red.
translate([-50,0,0])
{
	//color("Red")
	Encoder(true);
}


module Encoder_Keepaway(HiLo=true, 3dPrinterTolerance=.4)
{
	union()
	{
		Encoder(3dPrinterTolerance);
		translate([-EncoderWidth(3dPrinterTolerance)/2, -EncoderHeight(3dPrinterTolerance)+EncoderChipOffset(3dPrinterTolerance), 0])
		{
			cube([EncoderWidth(3dPrinterTolerance),EncoderThickness(3dPrinterTolerance)*8, EncoderThickness(3dPrinterTolerance)]);
		}
		translate([-(EncoderLongBoxWidth(3dPrinterTolerance)+EncoderShortBoxWidth(3dPrinterTolerance))/2-1,-(EncoderHeight(3dPrinterTolerance)+EncoderThickness(3dPrinterTolerance)*8)/2-1,0])
		{
			cube([EncoderLongBoxWidth(3dPrinterTolerance)+EncoderShortBoxWidth(3dPrinterTolerance)+1,EncoderHeight(3dPrinterTolerance)+EncoderThickness(3dPrinterTolerance)*16,EncoderHeight(3dPrinterTolerance)]);
		}
		//screws
		if(HiLo==true)
		{
			translate([-EncoderWidth()/2+EncoderThickness(),-EncoderChipOffset(3dPrinterTolerance)-EncoderThickness(3dPrinterTolerance)*1.2-3dPrinterTolerance+HiLoOffset(),EncoderBoltLength(3dPrinterTolerance)/2])

			{
				#HiLoScrew(3dPrinterTolerance-.05);
			}
			translate([EncoderWidth()/2-EncoderThickness(),-EncoderChipOffset(3dPrinterTolerance)-EncoderThickness(3dPrinterTolerance)*1.2-3dPrinterTolerance+HiLoOffset(),EncoderBoltLength(3dPrinterTolerance)/2])		
			{
				#HiLoScrew(3dPrinterTolerance-.05);
			}
		}else{}
	}
}

//This is the encoder with a keepaway, this is done so that you can fit the encoder into a slot, and use HiLo screws to hold it in, rather than purchasing the specific encoder bolts.
translate([50,0,0])
{
	union()
	{
		Encoder(false);
		%Encoder_Keepaway(true);
	}
}
// main file
//creates an extruder-specific encoder holder.  print two of these to effectively secure the encoder.

$fn=50;
use <../Vitamins/Sensors/Encoders/Encoder_Vitamin.scad>;
use <../Vitamins/Sensors/Encoders/EncoderMagnet_Vitamin.scad>;
use <../Vitamins/Fasteners/Screws/High_Low_Screw_Vitamin.scad>;
use <Extruder.scad>;
use <ExtruderIdlerWheel.scad>;

function GripWidth(3dPrinterTolerance=.4)= 3+3dPrinterTolerance;
function GripLength(3dPrinterTolerance=.4)= EncoderHeight(3dPrinterTolerance)+(HiLoScrewDiameter(3dPrinterTolerance));
function GripHeight(3dPrinterTolerance=.4)= EncoderThickness(3dPrinterTolerance)*2;
function GripSpacing(3dPrinterTolerance=.4)= EncoderWidth(3dPrinterTolerance)-GripWidth(3dPrinterTolerance);

module ScrewRing(3dPrinterTolerance=.4)
{
	difference()
	{
		cylinder(h=EncoderThickness(3dPrinterTolerance)*2, r=HiLoScrewDiameter(3dPrinterTolerance));
		translate([0,0,HiLoScrewLength(3dPrinterTolerance)/2]){HiLoScrew();}
	}
}
		

module EncoderGrip(3dPrinterTolerance=.4)
{
	difference()
	{
		union()
		{
			cube([GripLength(.4),GripWidth(.4),GripHeight(.4)]);
			translate([GripLength(.4)+HiLoScrewDiameter(3dPrinterTolerance)/2,GripWidth(.4)/2,0])
			{
				ScrewRing(.4);
			}
			translate([-HiLoScrewDiameter(3dPrinterTolerance)/2,GripWidth(.4)/2,0])
			{
				ScrewRing(.4);
			}
		}
		translate([GripLength(.4)-HiLoScrewDiameter(.4)*2.12,-EncoderHeight(.4)/2,-.001])
		{
			rotate ([0,0,90])
			{
				Encoder(false);
			}
		}
	}				
}

translate([-GripLength(.4)/2,GripSpacing(.4)/2,0])
{
EncoderGrip(.4);
}

translate([-GripLength(.4)/2,-GripSpacing(.4)/2,0])
{
	EncoderGrip(.4);
}

//translate([0,GripWidth(.4)/2,0]){rotate([0,0,90]){Encoder(.4);}}
